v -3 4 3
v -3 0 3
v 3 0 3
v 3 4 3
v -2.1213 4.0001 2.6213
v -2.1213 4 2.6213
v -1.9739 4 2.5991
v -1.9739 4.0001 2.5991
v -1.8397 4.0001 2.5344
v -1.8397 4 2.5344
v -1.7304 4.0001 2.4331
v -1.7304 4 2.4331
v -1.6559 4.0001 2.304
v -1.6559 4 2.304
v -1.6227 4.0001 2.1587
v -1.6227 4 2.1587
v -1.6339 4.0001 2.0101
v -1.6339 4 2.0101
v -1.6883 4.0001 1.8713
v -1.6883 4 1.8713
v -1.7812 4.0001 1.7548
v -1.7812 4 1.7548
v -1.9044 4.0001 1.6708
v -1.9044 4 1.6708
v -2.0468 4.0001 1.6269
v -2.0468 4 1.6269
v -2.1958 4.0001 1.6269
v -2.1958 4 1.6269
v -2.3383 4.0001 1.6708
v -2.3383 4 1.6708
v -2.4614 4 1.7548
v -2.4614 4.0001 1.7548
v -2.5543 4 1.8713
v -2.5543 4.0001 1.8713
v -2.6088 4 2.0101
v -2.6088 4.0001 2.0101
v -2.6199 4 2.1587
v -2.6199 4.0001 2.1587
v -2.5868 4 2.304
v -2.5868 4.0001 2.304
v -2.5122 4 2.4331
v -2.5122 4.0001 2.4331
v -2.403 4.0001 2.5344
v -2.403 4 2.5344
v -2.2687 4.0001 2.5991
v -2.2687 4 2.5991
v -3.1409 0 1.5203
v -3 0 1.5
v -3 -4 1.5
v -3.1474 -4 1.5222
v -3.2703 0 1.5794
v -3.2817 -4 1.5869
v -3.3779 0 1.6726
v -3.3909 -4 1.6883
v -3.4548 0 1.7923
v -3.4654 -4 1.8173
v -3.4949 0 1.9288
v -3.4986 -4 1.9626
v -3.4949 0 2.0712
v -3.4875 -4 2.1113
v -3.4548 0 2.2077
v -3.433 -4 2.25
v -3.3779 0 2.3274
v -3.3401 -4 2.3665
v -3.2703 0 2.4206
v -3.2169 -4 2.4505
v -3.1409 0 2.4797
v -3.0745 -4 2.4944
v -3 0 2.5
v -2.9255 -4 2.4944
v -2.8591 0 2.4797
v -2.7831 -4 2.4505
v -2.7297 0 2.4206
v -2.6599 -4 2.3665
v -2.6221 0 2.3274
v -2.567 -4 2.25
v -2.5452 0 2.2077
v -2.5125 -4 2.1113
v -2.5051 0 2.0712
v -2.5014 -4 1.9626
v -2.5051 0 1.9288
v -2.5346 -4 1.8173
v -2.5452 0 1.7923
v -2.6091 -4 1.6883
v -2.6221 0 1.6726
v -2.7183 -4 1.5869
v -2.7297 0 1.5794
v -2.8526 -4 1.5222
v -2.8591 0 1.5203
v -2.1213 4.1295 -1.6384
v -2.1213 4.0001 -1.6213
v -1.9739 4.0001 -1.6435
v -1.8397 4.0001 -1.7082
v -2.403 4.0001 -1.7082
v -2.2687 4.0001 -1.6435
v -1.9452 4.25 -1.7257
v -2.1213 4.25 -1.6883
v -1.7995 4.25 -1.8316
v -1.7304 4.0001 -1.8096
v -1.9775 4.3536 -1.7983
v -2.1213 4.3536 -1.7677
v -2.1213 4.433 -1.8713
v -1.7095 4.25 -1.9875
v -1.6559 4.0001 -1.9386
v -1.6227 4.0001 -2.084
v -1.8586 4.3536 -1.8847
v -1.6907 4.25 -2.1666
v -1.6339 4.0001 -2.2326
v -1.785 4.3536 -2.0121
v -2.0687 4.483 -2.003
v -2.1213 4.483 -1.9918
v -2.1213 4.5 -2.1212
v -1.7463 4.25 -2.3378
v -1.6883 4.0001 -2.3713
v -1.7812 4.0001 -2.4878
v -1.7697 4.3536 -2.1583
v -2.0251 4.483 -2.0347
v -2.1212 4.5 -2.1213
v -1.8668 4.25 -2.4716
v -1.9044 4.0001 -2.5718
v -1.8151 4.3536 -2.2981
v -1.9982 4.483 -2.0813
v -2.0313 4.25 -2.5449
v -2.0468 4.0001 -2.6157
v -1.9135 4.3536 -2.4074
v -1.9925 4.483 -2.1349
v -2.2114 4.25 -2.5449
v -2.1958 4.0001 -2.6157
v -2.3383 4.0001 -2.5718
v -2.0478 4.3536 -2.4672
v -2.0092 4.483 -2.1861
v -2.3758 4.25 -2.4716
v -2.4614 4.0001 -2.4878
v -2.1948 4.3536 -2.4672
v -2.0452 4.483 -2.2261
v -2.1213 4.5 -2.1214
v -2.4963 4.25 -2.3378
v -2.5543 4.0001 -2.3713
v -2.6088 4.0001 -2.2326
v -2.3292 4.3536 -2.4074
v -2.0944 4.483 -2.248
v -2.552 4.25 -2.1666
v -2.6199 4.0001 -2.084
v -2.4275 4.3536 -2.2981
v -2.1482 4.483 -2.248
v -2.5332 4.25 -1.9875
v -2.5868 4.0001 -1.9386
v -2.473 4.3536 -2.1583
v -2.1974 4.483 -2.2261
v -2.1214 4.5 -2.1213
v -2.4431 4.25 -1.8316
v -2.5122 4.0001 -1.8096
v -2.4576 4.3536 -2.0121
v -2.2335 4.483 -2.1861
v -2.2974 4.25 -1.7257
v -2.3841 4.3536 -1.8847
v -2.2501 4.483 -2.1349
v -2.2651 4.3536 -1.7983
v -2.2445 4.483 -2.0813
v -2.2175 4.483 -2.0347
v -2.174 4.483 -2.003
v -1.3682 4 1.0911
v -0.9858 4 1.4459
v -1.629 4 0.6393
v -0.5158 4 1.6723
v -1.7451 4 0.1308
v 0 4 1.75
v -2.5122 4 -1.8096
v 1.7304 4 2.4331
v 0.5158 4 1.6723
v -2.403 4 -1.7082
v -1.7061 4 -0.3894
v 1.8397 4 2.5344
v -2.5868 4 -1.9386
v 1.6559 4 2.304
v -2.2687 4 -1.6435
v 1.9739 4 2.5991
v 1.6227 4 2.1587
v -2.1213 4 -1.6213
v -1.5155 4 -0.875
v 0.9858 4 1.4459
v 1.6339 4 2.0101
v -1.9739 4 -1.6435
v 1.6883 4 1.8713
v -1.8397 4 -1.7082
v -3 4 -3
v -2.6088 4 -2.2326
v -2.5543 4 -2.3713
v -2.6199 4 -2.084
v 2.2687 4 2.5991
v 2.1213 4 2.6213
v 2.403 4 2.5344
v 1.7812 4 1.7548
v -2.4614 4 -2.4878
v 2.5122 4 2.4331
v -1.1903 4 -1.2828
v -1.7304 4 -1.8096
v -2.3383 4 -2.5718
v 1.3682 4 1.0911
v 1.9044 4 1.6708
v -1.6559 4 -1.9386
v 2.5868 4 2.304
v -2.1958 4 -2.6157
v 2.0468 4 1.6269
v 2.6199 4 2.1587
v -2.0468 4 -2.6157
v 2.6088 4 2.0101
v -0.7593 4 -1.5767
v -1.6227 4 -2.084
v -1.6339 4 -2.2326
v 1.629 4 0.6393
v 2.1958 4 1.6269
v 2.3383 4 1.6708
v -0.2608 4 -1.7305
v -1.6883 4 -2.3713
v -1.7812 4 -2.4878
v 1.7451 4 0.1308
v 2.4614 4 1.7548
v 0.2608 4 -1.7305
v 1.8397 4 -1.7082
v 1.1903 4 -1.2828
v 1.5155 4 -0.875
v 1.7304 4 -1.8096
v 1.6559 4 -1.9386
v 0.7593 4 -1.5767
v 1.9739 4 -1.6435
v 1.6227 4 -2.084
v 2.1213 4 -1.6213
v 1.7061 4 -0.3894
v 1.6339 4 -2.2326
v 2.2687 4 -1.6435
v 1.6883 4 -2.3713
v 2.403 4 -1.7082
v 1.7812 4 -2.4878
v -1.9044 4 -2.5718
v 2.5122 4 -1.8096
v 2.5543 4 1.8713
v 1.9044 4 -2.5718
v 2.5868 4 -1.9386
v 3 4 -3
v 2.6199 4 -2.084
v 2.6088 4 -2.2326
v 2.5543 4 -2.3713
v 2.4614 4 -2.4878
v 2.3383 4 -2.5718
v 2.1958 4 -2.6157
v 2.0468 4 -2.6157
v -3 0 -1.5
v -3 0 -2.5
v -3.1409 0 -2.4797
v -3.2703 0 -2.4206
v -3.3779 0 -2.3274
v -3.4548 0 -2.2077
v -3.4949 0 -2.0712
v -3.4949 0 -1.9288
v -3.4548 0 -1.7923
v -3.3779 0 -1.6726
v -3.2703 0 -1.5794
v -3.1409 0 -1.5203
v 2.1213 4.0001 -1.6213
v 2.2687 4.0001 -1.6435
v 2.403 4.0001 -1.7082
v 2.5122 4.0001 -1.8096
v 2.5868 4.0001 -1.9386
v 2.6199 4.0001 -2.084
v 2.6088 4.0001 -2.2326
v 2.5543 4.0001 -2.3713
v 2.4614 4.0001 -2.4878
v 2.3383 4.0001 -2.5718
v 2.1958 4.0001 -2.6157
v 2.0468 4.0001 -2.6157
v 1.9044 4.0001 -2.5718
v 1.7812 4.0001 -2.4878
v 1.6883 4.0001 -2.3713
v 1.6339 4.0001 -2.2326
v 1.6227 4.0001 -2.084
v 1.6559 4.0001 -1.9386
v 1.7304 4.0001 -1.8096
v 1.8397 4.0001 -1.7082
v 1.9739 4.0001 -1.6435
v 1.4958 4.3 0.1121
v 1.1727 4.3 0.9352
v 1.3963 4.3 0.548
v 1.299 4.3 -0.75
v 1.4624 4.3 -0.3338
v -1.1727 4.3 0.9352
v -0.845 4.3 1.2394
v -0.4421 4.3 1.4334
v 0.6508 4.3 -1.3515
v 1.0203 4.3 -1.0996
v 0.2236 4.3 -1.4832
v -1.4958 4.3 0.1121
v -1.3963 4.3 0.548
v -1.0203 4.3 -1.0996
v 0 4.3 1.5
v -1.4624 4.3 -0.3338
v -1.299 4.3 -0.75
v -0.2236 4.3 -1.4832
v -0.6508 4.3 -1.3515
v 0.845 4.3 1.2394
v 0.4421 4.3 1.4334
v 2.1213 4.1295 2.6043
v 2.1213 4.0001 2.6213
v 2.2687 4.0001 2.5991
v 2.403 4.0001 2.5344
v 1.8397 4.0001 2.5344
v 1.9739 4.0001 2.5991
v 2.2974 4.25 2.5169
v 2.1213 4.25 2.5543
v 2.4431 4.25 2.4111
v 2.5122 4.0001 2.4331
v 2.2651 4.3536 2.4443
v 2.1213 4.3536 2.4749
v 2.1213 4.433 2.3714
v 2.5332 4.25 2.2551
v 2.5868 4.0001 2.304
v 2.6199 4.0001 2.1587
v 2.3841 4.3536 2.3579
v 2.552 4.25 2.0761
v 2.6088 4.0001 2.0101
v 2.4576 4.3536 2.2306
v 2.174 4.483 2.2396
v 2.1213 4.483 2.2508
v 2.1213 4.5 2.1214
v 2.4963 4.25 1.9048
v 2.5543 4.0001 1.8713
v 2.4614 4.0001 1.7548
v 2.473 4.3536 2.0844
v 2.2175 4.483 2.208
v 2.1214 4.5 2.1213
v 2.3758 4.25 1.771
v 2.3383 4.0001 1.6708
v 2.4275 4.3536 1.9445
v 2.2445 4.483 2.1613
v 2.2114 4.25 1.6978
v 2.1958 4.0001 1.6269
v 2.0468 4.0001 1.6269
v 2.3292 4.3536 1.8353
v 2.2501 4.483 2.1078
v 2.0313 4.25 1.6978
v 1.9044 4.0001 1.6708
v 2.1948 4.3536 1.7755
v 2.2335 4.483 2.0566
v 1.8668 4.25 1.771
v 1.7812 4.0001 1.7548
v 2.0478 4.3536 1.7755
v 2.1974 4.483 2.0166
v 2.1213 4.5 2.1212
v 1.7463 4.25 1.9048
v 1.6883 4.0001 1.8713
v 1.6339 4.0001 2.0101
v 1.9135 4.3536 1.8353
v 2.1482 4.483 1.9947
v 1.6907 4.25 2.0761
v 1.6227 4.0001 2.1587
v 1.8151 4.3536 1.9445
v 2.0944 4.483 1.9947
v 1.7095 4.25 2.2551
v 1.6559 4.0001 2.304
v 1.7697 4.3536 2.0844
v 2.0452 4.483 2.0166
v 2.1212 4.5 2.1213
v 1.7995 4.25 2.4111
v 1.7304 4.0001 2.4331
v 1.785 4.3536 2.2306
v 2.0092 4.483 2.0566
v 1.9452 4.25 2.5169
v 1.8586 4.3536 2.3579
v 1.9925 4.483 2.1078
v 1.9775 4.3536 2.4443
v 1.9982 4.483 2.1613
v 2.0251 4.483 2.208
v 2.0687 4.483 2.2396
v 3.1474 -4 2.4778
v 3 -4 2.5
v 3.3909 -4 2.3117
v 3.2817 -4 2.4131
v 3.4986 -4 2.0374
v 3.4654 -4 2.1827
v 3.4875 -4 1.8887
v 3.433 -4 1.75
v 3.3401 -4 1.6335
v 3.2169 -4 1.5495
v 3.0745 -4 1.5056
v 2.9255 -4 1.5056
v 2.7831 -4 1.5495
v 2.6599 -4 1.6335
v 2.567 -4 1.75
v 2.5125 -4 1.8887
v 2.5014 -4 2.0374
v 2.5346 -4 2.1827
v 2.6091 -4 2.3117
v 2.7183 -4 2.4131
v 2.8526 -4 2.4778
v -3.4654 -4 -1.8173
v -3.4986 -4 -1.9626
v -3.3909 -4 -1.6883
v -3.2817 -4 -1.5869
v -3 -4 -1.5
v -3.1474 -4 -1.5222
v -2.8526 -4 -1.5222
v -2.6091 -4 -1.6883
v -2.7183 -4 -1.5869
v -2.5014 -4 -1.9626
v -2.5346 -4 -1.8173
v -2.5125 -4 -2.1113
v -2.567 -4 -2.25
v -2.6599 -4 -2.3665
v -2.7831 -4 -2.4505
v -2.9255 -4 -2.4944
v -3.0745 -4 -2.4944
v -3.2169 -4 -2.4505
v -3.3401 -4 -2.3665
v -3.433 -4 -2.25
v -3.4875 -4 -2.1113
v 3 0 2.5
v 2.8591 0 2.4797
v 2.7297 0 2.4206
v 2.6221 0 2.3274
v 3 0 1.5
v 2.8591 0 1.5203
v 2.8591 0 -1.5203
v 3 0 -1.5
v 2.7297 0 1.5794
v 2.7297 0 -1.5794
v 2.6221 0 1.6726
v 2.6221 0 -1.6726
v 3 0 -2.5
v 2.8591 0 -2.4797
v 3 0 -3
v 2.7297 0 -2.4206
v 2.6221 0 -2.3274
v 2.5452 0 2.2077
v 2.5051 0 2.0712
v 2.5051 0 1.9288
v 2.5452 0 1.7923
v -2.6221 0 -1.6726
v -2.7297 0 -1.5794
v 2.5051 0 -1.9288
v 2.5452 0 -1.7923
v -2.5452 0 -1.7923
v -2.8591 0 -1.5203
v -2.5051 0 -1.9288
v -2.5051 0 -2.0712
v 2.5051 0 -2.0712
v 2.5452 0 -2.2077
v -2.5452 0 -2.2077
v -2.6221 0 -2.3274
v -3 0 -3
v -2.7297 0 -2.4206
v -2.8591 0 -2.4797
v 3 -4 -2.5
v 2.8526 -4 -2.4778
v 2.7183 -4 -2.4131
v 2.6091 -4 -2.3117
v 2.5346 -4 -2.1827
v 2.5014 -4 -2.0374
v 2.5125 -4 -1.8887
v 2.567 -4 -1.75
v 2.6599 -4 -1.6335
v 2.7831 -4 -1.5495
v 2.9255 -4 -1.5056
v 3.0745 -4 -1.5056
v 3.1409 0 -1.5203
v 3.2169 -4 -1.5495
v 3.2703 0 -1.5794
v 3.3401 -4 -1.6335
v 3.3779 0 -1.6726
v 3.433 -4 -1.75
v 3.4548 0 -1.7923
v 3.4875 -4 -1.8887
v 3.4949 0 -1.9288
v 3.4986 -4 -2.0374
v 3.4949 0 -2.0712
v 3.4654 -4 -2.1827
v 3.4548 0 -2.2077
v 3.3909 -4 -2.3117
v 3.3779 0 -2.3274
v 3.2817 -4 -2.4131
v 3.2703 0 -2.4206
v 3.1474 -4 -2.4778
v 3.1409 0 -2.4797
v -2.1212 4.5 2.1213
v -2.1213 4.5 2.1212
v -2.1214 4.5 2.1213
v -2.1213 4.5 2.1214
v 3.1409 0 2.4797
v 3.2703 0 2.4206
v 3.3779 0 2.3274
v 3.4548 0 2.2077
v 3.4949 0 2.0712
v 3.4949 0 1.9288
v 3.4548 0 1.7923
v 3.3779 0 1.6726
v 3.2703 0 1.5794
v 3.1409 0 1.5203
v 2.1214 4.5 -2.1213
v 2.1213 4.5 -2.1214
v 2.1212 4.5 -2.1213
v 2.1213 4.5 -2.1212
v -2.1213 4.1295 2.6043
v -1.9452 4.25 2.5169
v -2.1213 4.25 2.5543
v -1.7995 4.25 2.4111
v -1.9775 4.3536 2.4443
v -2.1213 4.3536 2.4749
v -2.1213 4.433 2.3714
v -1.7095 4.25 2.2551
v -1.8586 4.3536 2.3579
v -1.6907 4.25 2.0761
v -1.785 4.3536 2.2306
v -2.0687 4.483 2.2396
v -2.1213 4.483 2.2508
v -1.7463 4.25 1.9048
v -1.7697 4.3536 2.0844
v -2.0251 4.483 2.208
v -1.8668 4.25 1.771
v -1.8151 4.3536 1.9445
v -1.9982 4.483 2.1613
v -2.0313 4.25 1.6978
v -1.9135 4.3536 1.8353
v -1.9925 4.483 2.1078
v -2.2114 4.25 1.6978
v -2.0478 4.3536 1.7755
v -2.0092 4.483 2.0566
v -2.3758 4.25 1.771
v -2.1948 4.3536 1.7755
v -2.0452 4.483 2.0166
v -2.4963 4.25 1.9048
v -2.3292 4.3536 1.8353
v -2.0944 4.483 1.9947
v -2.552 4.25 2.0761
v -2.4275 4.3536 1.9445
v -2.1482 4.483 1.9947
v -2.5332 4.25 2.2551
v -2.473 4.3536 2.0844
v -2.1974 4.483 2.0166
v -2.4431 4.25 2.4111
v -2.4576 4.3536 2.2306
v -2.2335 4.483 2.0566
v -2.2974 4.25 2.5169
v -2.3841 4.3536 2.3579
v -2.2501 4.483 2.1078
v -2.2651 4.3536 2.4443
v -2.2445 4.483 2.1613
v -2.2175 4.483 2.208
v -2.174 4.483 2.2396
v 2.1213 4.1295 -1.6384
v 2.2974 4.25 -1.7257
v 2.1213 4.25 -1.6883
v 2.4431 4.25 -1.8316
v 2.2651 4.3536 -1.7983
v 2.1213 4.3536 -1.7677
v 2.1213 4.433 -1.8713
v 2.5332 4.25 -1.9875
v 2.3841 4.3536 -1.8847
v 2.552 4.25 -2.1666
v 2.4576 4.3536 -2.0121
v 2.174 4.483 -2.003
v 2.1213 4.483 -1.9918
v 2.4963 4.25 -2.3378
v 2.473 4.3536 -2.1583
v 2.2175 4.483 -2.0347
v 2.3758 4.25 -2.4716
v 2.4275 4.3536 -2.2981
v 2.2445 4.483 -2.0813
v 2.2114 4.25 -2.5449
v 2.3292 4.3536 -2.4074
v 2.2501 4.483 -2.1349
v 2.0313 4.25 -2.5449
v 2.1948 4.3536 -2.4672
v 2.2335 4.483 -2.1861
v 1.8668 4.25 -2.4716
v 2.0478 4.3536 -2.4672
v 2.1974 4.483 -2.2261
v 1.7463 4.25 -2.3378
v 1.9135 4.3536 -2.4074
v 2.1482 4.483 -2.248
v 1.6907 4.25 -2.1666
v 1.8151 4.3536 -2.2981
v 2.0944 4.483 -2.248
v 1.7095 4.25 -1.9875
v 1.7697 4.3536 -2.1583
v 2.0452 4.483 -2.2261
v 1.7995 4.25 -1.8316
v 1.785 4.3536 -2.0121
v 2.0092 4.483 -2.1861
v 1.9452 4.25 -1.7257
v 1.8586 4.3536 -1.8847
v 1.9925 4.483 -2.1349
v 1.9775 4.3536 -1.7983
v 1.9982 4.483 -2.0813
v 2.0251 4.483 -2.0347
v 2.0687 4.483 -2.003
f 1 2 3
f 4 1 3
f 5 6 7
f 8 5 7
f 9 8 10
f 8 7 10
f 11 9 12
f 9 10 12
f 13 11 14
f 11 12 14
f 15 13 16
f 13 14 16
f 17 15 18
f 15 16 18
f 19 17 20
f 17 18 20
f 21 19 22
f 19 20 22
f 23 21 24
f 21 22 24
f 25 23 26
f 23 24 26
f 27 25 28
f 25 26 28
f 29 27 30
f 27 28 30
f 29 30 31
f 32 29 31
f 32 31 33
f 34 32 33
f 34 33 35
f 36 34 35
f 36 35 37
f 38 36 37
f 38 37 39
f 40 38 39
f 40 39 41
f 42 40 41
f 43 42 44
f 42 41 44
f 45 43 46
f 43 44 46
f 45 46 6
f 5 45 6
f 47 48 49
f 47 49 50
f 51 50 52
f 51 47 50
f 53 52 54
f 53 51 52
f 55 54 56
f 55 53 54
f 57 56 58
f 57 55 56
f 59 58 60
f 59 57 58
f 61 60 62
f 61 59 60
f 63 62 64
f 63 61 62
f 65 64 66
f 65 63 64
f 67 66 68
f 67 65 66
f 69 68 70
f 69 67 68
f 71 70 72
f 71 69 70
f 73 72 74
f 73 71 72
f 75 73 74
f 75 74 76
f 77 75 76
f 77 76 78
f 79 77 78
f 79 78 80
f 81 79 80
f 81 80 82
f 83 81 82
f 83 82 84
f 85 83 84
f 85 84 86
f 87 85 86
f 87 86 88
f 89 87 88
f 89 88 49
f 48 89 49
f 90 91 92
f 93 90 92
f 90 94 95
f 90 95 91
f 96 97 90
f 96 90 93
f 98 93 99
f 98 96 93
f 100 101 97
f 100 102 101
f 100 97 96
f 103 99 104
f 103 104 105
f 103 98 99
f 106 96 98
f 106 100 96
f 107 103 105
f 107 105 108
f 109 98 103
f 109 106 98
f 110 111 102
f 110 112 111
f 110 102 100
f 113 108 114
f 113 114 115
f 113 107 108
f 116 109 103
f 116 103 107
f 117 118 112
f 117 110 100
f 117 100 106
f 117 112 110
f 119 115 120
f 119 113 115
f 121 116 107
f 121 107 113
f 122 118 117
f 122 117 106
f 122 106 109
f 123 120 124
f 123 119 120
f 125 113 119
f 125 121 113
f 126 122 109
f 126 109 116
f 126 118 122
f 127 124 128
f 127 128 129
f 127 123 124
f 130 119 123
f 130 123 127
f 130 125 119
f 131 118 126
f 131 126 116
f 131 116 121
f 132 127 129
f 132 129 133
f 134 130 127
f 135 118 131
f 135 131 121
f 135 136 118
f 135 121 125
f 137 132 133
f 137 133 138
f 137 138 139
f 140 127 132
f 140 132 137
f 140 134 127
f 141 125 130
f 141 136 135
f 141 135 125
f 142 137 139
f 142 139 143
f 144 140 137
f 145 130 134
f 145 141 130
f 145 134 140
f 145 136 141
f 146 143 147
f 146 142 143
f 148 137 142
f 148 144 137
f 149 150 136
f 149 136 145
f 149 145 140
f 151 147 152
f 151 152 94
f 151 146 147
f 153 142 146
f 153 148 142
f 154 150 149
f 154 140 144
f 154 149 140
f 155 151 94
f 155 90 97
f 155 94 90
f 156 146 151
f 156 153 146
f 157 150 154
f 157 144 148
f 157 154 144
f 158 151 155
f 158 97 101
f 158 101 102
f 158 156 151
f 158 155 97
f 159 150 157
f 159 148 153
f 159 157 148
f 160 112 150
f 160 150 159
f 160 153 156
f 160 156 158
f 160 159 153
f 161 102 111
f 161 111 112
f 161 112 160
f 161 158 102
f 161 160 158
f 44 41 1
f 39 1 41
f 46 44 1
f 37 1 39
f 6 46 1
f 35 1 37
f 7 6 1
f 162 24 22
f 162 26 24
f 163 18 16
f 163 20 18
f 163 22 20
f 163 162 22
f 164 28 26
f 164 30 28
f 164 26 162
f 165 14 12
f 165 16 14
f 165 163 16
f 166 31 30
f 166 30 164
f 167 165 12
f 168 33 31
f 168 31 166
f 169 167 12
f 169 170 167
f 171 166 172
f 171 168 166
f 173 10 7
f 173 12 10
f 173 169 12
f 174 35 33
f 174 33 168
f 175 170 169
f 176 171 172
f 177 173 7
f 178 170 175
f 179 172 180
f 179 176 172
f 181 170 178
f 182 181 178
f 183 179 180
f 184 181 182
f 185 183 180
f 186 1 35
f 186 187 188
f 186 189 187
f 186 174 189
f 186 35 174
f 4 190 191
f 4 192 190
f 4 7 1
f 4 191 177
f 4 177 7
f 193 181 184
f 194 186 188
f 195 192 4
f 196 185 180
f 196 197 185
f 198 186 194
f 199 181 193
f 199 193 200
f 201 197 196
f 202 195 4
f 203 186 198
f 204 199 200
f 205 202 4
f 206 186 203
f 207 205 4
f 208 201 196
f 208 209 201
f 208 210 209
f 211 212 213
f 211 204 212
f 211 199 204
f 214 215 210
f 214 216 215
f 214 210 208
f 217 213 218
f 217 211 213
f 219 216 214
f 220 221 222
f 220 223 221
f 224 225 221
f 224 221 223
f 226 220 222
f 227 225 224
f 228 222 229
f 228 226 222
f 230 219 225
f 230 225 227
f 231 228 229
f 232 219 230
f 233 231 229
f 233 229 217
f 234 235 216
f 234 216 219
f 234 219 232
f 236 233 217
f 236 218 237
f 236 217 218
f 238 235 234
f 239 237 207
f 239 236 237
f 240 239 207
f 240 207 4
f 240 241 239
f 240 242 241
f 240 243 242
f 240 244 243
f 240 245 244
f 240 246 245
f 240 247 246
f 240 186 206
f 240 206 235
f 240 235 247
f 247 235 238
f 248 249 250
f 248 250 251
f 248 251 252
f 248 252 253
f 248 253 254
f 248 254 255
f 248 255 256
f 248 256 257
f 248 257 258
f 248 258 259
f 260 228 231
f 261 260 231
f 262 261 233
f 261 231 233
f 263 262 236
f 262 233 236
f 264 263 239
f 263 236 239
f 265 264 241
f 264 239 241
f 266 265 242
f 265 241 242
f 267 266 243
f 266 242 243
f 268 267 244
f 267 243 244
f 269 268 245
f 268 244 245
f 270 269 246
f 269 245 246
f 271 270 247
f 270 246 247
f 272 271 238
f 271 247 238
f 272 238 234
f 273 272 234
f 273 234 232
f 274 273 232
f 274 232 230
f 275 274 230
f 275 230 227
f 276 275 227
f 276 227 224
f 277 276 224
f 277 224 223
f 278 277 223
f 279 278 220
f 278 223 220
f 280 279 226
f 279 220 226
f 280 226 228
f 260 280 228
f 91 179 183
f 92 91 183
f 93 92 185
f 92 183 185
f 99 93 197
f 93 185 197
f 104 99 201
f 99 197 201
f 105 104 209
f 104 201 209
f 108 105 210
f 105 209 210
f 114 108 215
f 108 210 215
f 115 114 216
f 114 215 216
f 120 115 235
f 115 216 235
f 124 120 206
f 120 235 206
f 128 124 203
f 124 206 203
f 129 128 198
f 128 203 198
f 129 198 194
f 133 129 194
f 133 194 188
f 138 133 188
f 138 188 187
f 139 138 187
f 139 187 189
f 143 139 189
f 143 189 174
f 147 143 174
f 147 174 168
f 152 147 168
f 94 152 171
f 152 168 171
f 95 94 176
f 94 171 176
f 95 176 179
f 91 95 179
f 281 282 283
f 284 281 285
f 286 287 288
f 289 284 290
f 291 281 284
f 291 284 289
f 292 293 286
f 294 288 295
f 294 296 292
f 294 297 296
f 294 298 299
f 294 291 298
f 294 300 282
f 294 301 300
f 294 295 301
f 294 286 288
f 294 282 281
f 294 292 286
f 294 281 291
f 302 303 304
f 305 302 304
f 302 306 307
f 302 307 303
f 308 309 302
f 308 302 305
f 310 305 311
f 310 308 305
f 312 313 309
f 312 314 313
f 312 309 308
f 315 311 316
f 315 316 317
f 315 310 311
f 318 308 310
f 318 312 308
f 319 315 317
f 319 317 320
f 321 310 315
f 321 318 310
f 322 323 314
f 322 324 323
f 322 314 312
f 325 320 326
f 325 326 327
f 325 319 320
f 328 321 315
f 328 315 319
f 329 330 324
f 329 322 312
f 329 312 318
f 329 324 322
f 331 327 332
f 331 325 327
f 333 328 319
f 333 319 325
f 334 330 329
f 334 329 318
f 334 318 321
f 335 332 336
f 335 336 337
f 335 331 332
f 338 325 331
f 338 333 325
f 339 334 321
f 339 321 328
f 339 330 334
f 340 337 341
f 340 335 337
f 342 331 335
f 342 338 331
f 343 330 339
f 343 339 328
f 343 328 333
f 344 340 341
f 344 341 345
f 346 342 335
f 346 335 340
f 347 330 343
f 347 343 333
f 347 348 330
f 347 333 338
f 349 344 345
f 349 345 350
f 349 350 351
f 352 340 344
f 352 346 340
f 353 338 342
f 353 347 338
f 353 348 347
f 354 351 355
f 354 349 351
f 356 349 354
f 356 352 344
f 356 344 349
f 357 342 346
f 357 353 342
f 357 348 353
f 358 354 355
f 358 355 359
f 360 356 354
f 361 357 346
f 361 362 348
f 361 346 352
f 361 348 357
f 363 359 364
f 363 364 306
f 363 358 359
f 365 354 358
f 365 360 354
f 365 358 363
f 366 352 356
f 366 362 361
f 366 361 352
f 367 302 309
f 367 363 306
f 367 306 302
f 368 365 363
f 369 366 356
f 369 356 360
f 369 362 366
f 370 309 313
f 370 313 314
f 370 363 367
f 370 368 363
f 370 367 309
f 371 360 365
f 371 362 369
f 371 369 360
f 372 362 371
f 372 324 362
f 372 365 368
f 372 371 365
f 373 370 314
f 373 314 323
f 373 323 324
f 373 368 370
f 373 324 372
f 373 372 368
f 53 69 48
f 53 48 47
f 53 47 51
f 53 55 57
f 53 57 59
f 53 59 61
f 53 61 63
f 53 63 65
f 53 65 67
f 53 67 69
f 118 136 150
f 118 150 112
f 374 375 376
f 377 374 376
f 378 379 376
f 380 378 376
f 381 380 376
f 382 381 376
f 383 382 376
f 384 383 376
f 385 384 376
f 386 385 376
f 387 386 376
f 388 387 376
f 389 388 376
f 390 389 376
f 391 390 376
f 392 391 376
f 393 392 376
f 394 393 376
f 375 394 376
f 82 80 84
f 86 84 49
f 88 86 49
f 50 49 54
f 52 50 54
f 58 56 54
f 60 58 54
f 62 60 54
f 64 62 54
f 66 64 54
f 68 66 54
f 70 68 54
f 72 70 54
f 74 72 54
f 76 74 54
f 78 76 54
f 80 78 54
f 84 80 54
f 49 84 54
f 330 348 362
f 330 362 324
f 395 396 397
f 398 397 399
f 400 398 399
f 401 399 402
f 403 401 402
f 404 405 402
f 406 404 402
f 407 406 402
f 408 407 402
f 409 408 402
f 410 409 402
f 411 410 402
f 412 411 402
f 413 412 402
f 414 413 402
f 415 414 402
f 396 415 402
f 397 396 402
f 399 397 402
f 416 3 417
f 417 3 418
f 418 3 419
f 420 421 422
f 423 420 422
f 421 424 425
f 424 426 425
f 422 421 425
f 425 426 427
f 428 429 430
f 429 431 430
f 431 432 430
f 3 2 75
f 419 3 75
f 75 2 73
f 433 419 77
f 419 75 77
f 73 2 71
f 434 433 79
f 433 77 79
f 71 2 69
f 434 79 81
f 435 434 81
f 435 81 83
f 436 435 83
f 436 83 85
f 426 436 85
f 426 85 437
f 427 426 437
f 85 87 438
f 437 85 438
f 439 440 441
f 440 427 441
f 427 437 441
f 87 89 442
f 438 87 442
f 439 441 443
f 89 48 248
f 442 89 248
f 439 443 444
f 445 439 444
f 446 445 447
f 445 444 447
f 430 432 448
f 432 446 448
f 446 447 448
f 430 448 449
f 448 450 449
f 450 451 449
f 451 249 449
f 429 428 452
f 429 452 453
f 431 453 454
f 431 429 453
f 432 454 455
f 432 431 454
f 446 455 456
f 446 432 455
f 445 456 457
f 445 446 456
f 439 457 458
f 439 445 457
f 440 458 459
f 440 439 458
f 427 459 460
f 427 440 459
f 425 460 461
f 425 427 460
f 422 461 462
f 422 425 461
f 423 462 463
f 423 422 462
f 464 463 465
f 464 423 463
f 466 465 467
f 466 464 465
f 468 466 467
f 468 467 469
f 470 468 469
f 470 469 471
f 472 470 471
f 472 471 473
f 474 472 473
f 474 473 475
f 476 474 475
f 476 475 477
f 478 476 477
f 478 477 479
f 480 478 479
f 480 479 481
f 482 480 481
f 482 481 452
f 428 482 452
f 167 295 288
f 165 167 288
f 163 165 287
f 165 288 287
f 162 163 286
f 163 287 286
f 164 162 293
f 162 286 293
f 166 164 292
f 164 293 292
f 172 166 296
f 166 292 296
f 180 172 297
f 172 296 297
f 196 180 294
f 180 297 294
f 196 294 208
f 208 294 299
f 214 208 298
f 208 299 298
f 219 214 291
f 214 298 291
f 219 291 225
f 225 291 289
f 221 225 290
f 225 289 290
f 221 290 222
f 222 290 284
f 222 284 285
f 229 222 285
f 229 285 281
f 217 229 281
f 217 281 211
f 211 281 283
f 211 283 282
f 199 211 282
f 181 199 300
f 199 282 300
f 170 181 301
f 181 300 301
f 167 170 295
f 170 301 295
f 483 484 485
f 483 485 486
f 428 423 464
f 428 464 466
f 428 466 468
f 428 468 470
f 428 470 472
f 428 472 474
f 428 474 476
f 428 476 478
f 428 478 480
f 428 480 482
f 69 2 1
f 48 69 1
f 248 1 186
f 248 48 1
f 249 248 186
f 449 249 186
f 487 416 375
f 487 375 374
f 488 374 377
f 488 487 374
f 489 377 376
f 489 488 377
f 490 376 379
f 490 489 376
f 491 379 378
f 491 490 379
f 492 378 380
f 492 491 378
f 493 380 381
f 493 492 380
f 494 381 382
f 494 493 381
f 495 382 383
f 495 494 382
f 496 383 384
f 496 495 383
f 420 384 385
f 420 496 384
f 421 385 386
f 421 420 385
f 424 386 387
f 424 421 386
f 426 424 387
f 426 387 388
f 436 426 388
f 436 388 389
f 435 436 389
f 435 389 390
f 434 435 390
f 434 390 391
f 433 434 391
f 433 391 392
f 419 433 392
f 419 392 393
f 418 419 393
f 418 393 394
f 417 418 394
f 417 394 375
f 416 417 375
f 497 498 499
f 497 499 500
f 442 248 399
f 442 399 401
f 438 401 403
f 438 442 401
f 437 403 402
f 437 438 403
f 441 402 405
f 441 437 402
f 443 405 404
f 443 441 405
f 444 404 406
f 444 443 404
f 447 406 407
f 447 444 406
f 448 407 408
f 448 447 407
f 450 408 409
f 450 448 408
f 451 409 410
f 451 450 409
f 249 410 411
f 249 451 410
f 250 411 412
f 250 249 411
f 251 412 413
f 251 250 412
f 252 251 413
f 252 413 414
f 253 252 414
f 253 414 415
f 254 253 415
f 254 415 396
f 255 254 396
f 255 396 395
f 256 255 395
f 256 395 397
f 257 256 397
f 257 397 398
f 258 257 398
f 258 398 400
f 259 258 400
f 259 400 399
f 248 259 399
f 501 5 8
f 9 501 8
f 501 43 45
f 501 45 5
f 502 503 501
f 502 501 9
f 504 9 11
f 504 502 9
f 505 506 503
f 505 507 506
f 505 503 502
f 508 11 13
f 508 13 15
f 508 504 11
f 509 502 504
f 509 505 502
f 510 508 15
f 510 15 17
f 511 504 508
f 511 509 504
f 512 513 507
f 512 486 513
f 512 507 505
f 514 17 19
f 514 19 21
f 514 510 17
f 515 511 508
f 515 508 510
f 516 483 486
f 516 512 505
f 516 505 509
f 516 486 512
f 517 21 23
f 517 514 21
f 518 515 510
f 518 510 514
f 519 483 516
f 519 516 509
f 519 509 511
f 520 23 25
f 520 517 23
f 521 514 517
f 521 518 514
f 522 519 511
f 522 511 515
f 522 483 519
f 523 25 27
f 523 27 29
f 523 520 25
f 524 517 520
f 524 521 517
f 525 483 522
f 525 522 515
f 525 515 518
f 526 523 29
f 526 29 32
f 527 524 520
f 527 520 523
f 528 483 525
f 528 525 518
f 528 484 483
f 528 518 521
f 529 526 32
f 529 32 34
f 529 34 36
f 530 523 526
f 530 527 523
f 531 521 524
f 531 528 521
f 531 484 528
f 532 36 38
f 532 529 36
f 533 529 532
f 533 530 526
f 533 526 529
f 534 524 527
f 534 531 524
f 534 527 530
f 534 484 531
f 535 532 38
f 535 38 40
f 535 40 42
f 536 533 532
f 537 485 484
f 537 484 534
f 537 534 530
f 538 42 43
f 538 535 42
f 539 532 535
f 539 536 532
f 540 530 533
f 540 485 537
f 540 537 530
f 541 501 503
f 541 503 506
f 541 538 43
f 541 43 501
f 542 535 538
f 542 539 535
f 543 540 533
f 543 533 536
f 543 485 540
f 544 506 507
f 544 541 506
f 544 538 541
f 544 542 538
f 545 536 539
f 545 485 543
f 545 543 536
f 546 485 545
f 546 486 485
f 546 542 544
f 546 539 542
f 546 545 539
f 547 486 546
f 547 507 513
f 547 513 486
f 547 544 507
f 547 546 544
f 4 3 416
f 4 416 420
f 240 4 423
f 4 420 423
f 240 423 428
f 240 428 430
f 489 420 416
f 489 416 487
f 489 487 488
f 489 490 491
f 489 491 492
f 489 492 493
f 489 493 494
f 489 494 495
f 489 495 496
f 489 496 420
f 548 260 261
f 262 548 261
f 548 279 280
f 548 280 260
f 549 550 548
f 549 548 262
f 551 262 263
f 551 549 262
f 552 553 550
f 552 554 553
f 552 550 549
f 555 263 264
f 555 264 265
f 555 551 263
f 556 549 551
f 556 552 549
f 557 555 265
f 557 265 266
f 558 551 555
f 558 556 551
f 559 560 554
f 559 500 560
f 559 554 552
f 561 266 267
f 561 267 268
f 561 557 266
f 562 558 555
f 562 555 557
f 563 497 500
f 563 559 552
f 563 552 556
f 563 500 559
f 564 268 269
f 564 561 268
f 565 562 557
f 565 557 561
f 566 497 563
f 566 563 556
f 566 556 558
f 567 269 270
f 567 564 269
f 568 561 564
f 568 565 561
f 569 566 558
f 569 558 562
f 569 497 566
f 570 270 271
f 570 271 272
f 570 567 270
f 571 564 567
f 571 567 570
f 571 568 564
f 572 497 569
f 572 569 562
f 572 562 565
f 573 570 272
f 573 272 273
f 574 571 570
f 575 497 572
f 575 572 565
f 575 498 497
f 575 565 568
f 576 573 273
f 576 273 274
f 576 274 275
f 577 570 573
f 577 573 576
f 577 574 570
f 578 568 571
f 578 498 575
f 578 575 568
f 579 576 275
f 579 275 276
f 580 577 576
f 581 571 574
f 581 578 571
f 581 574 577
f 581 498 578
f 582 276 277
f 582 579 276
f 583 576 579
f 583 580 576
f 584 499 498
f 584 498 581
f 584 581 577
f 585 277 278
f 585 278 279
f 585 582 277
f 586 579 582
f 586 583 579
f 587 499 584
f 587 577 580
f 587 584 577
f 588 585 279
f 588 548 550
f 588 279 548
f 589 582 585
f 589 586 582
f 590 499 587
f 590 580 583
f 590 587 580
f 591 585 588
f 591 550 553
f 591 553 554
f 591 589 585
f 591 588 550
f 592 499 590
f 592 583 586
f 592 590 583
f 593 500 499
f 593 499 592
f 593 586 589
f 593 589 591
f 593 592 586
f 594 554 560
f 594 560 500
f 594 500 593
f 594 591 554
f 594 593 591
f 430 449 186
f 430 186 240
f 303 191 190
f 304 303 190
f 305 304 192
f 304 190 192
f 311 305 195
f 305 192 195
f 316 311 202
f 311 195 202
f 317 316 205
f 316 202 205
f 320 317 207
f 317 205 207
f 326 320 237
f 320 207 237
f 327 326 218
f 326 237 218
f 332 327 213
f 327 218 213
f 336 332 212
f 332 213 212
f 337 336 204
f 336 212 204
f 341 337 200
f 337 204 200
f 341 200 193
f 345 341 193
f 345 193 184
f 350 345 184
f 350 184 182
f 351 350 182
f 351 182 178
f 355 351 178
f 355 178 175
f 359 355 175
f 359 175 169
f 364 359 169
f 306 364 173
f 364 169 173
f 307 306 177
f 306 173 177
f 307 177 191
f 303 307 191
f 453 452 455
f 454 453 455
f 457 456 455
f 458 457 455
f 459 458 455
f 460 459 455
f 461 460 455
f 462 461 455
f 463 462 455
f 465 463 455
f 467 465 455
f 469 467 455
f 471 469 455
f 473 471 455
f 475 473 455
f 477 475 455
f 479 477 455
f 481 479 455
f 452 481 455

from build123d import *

# Parameters (mm, degrees)
SKETCH1_W           = 6
SKETCH1_H           = 6
BOSS_EXTRUDE1_DEPTH = 4
BOSS_EXTRUDE2_START = -4
SKETCH2_R           = 1.75
BOSS_EXTRUDE2_DEPTH = 4.3
SKETCH4_R           = 0.5
BOSS_EXTRUDE3_DEPTH = 0.5
FILLET1_R           = 0.5
SKETCH5_R           = 0.5
BOSS_EXTRUDE4_DEPTH = 4


with BuildPart() as part:
    # Sketch1 → Boss-Extrude1 (new body)
    with BuildSketch(Plane(origin=(0, 0, 0), x_dir=(1, 0, 0), z_dir=(0, 1, 0))):
        Rectangle(SKETCH1_W, SKETCH1_H)
    extrude(amount=BOSS_EXTRUDE1_DEPTH)

    # Sketch2 → Boss-Extrude2 (add)
    with BuildSketch(Plane(origin=(0, 4, 0), x_dir=(1, 0, 0), z_dir=(0, 1, 0)).offset(BOSS_EXTRUDE2_START)):
        with Locations(Location((0, 0, 0), (0, 0, 90))):
            Circle(SKETCH2_R)
    extrude(amount=BOSS_EXTRUDE2_DEPTH)

    # Sketch3 → Cut-Revolve1 (revolve, cut)
    with BuildSketch(Plane(origin=(0, 0, 0), x_dir=(0, 0, -1), z_dir=(1, 0, 0))):
        Polygon((-1.75, 4.3), (-1.75, 4), (-1.5, 4.3), align=None)
    revolve(axis=Axis((0, 8.374446569, 0), (0, -1, 0)), mode=Mode.SUBTRACT)

    # Sketch4 → Boss-Extrude3 (add)
    with BuildSketch(Plane(origin=(0, 4, 0), x_dir=(1, 0, 0), z_dir=(0, 1, 0))):
        with Locations(Location((-2.121320344, 2.121320344, 0), (0, 0, 270))):
            Circle(SKETCH4_R)
        with Locations(Location((2.121320344, 2.121320344, 0), (0, 0, 270))):
            Circle(SKETCH4_R)
        with Locations(Location((2.121320344, -2.121320344, 0), (0, 0, 270))):
            Circle(SKETCH4_R)
        with Locations(Location((-2.121320344, -2.121320344, 0), (0, 0, 270))):
            Circle(SKETCH4_R)
    extrude(amount=BOSS_EXTRUDE3_DEPTH)

    # Fillet1
    fillet1_edges = [part.edges().sort_by_distance(p)[0] for p in [
        (-2.121320344, 4.5, -2.621320344),
        (2.121320344, 4.5, -2.621320344),
        (2.121320344, 4.5, 1.621320344),
        (-2.121320344, 4.5, 1.621320344),
    ]]
    fillet(fillet1_edges, radius=FILLET1_R - 0.0001)  # a hair under: the kernel refuses the full size

    # Sketch5 → Boss-Extrude4 (add)
    with BuildSketch(Plane(origin=(0, 0, 0), x_dir=(1, 0, 0), z_dir=(0, 1, 0))):
        with Locations(Location((3, -2, 0), (0, 0, 270))):
            Circle(SKETCH5_R)
        with Locations(Location((3, 2, 0), (0, 0, 90))):
            Circle(SKETCH5_R)
        with Locations(Location((-3, 2, 0), (0, 0, 270))):
            Circle(SKETCH5_R)
        with Locations(Location((-3, -2, 0), (0, 0, 90))):
            Circle(SKETCH5_R)
    extrude(amount=-BOSS_EXTRUDE4_DEPTH)


solid = part.part
